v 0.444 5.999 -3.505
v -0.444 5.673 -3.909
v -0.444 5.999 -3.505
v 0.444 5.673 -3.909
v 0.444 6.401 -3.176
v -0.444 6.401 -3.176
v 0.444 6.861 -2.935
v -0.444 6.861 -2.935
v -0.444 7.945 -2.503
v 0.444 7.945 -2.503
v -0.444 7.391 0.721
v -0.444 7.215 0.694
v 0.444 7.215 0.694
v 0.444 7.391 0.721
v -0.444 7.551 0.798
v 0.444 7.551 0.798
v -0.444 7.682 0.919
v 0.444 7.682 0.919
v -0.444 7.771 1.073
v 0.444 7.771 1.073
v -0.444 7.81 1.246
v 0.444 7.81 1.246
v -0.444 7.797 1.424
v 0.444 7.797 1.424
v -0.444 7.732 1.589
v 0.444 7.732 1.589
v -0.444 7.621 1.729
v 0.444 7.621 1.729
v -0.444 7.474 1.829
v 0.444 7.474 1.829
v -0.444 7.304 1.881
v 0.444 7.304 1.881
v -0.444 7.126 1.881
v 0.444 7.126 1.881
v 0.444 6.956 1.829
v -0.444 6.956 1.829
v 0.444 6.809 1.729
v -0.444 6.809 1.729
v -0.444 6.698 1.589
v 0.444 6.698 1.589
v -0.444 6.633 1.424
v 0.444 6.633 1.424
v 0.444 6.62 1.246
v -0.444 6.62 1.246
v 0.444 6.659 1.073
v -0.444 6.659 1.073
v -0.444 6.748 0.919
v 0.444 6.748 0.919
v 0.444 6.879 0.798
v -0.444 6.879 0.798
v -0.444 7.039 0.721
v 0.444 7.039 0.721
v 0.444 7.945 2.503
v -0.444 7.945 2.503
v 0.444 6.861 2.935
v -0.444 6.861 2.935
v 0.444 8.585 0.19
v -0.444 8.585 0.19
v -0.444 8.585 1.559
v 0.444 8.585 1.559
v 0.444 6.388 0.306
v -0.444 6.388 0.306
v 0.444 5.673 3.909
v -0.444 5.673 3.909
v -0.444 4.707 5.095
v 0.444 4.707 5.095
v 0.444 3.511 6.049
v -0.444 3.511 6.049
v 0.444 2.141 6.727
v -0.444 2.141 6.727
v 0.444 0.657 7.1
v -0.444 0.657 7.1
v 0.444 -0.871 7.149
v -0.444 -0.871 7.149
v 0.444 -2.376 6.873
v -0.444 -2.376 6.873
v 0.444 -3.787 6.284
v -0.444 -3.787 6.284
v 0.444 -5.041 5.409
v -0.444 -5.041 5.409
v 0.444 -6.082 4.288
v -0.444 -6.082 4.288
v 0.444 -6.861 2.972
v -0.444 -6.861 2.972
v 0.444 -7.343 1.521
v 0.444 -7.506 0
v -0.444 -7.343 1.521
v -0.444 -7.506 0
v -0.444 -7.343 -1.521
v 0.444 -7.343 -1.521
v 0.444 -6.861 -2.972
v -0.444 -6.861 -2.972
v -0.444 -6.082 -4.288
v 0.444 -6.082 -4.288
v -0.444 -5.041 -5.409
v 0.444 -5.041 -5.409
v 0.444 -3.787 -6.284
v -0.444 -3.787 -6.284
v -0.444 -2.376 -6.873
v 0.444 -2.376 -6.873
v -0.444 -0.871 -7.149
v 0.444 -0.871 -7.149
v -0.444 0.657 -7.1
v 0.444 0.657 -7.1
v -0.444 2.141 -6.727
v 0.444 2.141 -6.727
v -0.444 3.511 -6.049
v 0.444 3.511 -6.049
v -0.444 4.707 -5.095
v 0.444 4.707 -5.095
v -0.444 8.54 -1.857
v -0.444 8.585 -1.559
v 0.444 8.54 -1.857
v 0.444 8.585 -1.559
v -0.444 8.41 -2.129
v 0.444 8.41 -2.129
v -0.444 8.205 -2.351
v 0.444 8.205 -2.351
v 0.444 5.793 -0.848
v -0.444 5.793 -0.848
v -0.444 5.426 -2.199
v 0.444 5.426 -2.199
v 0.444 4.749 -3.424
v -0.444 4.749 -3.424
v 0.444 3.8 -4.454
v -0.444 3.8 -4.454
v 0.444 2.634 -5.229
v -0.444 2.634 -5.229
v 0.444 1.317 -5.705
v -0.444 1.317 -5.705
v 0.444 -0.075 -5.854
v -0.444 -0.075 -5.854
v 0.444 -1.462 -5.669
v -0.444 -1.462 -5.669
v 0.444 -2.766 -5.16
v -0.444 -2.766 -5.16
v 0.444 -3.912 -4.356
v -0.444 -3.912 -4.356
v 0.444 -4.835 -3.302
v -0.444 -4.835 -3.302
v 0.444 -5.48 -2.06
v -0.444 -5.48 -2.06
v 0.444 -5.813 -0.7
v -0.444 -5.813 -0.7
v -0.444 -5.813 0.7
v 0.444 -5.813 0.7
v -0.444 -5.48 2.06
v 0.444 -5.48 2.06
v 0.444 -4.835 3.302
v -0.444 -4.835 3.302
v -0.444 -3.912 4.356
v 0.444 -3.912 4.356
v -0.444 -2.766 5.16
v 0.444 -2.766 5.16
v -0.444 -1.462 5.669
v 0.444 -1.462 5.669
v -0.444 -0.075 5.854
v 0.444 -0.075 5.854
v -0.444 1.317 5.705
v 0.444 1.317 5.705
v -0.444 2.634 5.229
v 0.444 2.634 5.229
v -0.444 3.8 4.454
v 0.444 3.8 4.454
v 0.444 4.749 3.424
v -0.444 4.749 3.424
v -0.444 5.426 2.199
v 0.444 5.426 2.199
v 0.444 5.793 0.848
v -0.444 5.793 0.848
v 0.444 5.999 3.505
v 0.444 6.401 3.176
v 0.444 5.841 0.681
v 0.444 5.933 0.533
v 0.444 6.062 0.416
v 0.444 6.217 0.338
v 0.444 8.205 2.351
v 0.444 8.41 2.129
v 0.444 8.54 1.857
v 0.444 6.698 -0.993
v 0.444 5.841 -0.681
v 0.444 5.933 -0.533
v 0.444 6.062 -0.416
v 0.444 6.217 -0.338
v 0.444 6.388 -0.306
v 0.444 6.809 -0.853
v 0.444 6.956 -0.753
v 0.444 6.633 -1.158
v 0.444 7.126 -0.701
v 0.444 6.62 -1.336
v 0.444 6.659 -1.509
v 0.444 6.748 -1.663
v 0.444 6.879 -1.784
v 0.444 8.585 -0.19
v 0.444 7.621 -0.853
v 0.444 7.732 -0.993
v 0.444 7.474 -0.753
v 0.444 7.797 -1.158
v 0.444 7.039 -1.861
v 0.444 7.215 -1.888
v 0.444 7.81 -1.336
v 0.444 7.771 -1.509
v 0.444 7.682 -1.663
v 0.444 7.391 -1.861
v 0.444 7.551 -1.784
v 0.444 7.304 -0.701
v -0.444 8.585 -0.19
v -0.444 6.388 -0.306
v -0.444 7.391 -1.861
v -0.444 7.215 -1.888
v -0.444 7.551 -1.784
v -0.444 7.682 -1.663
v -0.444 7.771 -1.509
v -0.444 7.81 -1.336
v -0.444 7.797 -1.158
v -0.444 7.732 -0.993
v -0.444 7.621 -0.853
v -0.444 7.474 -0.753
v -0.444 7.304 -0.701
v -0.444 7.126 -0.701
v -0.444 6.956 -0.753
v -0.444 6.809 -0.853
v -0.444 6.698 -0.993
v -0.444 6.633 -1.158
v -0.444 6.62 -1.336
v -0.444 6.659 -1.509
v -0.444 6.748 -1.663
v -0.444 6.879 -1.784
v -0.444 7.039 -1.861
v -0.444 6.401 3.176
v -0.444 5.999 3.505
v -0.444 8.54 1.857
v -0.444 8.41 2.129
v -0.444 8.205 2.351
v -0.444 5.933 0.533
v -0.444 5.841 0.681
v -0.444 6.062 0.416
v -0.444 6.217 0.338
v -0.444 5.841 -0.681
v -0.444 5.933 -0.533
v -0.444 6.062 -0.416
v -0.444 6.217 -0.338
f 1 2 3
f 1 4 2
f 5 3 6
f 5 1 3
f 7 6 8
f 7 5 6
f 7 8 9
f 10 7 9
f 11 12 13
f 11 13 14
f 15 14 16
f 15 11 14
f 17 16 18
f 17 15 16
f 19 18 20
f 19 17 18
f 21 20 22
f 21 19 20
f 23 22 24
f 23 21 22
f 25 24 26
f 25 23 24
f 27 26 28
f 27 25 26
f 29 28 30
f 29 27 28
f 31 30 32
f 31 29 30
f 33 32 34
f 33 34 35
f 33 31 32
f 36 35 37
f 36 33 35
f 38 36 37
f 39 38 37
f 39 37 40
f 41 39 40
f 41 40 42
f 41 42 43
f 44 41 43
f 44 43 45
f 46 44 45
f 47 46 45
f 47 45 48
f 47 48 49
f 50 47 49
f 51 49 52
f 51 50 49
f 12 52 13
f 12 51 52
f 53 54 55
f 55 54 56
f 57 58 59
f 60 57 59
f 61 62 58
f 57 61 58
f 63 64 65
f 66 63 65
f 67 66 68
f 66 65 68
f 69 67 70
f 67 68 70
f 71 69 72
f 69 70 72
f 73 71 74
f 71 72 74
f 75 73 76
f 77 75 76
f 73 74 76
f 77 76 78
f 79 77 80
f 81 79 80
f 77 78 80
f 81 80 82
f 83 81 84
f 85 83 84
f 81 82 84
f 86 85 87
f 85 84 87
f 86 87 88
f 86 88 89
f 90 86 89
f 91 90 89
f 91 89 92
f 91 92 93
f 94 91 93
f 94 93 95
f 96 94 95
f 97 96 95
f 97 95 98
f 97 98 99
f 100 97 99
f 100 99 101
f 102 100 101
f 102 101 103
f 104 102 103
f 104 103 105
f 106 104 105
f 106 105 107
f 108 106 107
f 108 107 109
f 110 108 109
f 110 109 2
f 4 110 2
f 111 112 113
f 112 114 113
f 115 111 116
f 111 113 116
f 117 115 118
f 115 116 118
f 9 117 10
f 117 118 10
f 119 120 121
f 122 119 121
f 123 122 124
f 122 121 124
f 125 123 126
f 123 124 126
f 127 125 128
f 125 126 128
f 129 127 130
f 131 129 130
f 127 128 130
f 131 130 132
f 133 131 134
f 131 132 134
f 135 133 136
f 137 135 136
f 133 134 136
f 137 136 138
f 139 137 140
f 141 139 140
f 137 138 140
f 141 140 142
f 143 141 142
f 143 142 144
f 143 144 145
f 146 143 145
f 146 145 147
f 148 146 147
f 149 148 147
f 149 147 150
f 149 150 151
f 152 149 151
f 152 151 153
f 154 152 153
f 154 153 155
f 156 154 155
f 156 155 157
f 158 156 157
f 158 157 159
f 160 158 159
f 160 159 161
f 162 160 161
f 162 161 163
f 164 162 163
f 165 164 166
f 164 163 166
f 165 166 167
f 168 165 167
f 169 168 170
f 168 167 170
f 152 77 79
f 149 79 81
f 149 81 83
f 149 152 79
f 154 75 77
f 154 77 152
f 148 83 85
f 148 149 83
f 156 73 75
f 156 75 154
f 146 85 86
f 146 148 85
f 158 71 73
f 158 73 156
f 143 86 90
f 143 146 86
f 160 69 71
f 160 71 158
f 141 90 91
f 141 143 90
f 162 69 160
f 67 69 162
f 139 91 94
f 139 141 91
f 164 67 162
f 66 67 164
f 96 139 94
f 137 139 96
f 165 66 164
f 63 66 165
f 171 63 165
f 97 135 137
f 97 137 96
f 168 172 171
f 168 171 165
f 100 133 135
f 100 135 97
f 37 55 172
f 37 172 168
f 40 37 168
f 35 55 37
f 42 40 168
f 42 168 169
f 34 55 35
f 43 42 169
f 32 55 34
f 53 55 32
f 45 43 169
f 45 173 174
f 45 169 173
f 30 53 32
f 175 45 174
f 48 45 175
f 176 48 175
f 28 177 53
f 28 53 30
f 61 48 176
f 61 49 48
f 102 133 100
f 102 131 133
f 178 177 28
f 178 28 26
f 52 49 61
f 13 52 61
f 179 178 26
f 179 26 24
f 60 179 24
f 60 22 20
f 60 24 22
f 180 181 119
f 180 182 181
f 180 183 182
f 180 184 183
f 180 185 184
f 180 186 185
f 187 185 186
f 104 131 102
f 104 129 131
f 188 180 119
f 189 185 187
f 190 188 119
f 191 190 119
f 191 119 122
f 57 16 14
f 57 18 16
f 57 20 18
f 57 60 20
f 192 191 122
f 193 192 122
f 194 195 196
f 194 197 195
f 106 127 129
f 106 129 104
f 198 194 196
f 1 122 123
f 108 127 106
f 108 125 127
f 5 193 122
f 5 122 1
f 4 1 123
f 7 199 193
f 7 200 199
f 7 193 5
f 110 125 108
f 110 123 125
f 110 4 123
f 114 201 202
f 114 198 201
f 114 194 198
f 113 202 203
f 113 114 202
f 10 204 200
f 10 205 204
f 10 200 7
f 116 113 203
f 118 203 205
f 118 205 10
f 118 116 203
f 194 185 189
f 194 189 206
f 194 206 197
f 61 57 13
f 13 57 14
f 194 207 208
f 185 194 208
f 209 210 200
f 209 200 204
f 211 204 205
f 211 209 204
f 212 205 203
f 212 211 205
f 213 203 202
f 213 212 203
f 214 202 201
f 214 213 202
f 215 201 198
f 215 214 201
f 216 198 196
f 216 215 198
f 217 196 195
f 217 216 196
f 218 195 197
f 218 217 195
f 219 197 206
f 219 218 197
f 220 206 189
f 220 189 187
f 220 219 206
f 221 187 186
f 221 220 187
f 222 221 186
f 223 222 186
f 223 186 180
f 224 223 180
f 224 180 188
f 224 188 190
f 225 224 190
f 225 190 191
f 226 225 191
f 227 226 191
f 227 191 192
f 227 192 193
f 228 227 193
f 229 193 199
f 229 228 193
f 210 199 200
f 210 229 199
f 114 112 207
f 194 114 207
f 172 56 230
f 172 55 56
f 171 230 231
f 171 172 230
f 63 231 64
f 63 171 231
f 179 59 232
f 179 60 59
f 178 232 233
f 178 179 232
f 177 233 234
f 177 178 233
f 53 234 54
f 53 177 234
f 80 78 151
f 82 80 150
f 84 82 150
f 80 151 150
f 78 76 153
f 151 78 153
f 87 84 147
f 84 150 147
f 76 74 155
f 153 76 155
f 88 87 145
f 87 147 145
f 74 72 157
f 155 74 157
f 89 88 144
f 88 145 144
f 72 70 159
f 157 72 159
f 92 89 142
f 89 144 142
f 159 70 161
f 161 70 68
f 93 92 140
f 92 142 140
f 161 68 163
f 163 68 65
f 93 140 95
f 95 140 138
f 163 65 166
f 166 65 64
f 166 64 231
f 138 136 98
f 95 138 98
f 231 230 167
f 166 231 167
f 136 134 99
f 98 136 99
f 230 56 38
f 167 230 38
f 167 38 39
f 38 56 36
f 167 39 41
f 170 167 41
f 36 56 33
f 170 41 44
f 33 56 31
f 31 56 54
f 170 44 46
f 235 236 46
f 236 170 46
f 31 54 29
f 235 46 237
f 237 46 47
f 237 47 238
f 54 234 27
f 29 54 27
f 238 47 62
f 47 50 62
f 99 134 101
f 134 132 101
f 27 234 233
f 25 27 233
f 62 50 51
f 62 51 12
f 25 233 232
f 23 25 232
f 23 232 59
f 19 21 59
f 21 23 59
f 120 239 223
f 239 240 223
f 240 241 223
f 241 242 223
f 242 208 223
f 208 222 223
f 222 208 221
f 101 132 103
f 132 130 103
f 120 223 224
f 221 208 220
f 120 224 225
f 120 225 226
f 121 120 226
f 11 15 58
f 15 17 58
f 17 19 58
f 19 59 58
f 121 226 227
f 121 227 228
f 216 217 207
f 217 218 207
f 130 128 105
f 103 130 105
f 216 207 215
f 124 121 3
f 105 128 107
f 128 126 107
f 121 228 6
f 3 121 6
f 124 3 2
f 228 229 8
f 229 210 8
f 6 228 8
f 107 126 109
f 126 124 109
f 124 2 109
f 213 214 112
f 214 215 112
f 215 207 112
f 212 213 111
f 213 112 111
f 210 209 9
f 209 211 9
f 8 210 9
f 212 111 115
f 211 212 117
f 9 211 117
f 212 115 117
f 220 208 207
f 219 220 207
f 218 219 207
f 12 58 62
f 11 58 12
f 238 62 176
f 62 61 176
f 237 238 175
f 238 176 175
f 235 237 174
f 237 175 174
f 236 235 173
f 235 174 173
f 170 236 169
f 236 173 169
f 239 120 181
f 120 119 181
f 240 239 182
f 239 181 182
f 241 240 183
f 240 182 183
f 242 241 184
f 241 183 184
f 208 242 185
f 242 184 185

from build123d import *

# Parameters (mm, degrees)
BOSS_EXTRUDE1_DEPTH      = 0.4445
BOSS_EXTRUDE1_DEPTH_BACK = 0.4445
SKETCH3_R                = 0.5969
FILLET1_R                = 2.54
FILLET2_R                = 0.635
FILLET3_R                = 1.016


with BuildPart() as part:
    # Sketch3 → Boss-Extrude1 (new, two sides: drawn at the far end of the back side and taken through both)
    with BuildSketch(Plane(origin=(0, 0, 0), x_dir=(0, 0, -1), z_dir=(1, 0, 0)).offset(-BOSS_EXTRUDE1_DEPTH_BACK)):
        with BuildLine():
            Line((-2.2479, 8.584601843), (-3.258723069, 6.048738914))
            ThreePointArc((-3.258723069, 6.048738914), (0, -7.5057), (3.258723069, 6.048738914))
            Line((3.258723069, 6.048738914), (2.2479, 8.584601843))
            Line((2.2479, 8.584601843), (0.1905, 8.584601843))
            Line((0.1905, 8.584601843), (0.334067995, 5.845161304))
            ThreePointArc((0.334067995, 5.845161304), (0, -5.8547), (-0.334067995, 5.845161304))
            Line((-0.334067995, 5.845161304), (-0.1905, 8.584601843))
            Line((-0.1905, 8.584601843), (-2.2479, 8.584601843))
        make_face()
        with Locations((-1.290983998, 7.214881573)):
            Circle(SKETCH3_R, mode=Mode.SUBTRACT)
        with Locations((1.290983998, 7.214881573)):
            Circle(SKETCH3_R, mode=Mode.SUBTRACT)
    extrude(amount=BOSS_EXTRUDE1_DEPTH + BOSS_EXTRUDE1_DEPTH_BACK)

    # Fillet1
    fillet1_edges = [part.edges().sort_by_distance(p)[0] for p in [
        (0, 6.048738914, 3.258723069),
        (0, 6.048738914, -3.258723069),
    ]]
    fillet(fillet1_edges, radius=FILLET1_R)

    # Fillet2
    fillet2_edges = [part.edges().sort_by_distance(p)[0] for p in [
        (0, 5.845161304, 0.334067995),
        (0, 5.845161304, -0.334067995),
    ]]
    fillet(fillet2_edges, radius=FILLET2_R)

    # Fillet3
    fillet3_edges = [part.edges().sort_by_distance(p)[0] for p in [
        (0, 8.584601843, 2.2479),
        (0, 8.584601843, -2.2479),
    ]]
    fillet(fillet3_edges, radius=FILLET3_R)


solid = part.part
